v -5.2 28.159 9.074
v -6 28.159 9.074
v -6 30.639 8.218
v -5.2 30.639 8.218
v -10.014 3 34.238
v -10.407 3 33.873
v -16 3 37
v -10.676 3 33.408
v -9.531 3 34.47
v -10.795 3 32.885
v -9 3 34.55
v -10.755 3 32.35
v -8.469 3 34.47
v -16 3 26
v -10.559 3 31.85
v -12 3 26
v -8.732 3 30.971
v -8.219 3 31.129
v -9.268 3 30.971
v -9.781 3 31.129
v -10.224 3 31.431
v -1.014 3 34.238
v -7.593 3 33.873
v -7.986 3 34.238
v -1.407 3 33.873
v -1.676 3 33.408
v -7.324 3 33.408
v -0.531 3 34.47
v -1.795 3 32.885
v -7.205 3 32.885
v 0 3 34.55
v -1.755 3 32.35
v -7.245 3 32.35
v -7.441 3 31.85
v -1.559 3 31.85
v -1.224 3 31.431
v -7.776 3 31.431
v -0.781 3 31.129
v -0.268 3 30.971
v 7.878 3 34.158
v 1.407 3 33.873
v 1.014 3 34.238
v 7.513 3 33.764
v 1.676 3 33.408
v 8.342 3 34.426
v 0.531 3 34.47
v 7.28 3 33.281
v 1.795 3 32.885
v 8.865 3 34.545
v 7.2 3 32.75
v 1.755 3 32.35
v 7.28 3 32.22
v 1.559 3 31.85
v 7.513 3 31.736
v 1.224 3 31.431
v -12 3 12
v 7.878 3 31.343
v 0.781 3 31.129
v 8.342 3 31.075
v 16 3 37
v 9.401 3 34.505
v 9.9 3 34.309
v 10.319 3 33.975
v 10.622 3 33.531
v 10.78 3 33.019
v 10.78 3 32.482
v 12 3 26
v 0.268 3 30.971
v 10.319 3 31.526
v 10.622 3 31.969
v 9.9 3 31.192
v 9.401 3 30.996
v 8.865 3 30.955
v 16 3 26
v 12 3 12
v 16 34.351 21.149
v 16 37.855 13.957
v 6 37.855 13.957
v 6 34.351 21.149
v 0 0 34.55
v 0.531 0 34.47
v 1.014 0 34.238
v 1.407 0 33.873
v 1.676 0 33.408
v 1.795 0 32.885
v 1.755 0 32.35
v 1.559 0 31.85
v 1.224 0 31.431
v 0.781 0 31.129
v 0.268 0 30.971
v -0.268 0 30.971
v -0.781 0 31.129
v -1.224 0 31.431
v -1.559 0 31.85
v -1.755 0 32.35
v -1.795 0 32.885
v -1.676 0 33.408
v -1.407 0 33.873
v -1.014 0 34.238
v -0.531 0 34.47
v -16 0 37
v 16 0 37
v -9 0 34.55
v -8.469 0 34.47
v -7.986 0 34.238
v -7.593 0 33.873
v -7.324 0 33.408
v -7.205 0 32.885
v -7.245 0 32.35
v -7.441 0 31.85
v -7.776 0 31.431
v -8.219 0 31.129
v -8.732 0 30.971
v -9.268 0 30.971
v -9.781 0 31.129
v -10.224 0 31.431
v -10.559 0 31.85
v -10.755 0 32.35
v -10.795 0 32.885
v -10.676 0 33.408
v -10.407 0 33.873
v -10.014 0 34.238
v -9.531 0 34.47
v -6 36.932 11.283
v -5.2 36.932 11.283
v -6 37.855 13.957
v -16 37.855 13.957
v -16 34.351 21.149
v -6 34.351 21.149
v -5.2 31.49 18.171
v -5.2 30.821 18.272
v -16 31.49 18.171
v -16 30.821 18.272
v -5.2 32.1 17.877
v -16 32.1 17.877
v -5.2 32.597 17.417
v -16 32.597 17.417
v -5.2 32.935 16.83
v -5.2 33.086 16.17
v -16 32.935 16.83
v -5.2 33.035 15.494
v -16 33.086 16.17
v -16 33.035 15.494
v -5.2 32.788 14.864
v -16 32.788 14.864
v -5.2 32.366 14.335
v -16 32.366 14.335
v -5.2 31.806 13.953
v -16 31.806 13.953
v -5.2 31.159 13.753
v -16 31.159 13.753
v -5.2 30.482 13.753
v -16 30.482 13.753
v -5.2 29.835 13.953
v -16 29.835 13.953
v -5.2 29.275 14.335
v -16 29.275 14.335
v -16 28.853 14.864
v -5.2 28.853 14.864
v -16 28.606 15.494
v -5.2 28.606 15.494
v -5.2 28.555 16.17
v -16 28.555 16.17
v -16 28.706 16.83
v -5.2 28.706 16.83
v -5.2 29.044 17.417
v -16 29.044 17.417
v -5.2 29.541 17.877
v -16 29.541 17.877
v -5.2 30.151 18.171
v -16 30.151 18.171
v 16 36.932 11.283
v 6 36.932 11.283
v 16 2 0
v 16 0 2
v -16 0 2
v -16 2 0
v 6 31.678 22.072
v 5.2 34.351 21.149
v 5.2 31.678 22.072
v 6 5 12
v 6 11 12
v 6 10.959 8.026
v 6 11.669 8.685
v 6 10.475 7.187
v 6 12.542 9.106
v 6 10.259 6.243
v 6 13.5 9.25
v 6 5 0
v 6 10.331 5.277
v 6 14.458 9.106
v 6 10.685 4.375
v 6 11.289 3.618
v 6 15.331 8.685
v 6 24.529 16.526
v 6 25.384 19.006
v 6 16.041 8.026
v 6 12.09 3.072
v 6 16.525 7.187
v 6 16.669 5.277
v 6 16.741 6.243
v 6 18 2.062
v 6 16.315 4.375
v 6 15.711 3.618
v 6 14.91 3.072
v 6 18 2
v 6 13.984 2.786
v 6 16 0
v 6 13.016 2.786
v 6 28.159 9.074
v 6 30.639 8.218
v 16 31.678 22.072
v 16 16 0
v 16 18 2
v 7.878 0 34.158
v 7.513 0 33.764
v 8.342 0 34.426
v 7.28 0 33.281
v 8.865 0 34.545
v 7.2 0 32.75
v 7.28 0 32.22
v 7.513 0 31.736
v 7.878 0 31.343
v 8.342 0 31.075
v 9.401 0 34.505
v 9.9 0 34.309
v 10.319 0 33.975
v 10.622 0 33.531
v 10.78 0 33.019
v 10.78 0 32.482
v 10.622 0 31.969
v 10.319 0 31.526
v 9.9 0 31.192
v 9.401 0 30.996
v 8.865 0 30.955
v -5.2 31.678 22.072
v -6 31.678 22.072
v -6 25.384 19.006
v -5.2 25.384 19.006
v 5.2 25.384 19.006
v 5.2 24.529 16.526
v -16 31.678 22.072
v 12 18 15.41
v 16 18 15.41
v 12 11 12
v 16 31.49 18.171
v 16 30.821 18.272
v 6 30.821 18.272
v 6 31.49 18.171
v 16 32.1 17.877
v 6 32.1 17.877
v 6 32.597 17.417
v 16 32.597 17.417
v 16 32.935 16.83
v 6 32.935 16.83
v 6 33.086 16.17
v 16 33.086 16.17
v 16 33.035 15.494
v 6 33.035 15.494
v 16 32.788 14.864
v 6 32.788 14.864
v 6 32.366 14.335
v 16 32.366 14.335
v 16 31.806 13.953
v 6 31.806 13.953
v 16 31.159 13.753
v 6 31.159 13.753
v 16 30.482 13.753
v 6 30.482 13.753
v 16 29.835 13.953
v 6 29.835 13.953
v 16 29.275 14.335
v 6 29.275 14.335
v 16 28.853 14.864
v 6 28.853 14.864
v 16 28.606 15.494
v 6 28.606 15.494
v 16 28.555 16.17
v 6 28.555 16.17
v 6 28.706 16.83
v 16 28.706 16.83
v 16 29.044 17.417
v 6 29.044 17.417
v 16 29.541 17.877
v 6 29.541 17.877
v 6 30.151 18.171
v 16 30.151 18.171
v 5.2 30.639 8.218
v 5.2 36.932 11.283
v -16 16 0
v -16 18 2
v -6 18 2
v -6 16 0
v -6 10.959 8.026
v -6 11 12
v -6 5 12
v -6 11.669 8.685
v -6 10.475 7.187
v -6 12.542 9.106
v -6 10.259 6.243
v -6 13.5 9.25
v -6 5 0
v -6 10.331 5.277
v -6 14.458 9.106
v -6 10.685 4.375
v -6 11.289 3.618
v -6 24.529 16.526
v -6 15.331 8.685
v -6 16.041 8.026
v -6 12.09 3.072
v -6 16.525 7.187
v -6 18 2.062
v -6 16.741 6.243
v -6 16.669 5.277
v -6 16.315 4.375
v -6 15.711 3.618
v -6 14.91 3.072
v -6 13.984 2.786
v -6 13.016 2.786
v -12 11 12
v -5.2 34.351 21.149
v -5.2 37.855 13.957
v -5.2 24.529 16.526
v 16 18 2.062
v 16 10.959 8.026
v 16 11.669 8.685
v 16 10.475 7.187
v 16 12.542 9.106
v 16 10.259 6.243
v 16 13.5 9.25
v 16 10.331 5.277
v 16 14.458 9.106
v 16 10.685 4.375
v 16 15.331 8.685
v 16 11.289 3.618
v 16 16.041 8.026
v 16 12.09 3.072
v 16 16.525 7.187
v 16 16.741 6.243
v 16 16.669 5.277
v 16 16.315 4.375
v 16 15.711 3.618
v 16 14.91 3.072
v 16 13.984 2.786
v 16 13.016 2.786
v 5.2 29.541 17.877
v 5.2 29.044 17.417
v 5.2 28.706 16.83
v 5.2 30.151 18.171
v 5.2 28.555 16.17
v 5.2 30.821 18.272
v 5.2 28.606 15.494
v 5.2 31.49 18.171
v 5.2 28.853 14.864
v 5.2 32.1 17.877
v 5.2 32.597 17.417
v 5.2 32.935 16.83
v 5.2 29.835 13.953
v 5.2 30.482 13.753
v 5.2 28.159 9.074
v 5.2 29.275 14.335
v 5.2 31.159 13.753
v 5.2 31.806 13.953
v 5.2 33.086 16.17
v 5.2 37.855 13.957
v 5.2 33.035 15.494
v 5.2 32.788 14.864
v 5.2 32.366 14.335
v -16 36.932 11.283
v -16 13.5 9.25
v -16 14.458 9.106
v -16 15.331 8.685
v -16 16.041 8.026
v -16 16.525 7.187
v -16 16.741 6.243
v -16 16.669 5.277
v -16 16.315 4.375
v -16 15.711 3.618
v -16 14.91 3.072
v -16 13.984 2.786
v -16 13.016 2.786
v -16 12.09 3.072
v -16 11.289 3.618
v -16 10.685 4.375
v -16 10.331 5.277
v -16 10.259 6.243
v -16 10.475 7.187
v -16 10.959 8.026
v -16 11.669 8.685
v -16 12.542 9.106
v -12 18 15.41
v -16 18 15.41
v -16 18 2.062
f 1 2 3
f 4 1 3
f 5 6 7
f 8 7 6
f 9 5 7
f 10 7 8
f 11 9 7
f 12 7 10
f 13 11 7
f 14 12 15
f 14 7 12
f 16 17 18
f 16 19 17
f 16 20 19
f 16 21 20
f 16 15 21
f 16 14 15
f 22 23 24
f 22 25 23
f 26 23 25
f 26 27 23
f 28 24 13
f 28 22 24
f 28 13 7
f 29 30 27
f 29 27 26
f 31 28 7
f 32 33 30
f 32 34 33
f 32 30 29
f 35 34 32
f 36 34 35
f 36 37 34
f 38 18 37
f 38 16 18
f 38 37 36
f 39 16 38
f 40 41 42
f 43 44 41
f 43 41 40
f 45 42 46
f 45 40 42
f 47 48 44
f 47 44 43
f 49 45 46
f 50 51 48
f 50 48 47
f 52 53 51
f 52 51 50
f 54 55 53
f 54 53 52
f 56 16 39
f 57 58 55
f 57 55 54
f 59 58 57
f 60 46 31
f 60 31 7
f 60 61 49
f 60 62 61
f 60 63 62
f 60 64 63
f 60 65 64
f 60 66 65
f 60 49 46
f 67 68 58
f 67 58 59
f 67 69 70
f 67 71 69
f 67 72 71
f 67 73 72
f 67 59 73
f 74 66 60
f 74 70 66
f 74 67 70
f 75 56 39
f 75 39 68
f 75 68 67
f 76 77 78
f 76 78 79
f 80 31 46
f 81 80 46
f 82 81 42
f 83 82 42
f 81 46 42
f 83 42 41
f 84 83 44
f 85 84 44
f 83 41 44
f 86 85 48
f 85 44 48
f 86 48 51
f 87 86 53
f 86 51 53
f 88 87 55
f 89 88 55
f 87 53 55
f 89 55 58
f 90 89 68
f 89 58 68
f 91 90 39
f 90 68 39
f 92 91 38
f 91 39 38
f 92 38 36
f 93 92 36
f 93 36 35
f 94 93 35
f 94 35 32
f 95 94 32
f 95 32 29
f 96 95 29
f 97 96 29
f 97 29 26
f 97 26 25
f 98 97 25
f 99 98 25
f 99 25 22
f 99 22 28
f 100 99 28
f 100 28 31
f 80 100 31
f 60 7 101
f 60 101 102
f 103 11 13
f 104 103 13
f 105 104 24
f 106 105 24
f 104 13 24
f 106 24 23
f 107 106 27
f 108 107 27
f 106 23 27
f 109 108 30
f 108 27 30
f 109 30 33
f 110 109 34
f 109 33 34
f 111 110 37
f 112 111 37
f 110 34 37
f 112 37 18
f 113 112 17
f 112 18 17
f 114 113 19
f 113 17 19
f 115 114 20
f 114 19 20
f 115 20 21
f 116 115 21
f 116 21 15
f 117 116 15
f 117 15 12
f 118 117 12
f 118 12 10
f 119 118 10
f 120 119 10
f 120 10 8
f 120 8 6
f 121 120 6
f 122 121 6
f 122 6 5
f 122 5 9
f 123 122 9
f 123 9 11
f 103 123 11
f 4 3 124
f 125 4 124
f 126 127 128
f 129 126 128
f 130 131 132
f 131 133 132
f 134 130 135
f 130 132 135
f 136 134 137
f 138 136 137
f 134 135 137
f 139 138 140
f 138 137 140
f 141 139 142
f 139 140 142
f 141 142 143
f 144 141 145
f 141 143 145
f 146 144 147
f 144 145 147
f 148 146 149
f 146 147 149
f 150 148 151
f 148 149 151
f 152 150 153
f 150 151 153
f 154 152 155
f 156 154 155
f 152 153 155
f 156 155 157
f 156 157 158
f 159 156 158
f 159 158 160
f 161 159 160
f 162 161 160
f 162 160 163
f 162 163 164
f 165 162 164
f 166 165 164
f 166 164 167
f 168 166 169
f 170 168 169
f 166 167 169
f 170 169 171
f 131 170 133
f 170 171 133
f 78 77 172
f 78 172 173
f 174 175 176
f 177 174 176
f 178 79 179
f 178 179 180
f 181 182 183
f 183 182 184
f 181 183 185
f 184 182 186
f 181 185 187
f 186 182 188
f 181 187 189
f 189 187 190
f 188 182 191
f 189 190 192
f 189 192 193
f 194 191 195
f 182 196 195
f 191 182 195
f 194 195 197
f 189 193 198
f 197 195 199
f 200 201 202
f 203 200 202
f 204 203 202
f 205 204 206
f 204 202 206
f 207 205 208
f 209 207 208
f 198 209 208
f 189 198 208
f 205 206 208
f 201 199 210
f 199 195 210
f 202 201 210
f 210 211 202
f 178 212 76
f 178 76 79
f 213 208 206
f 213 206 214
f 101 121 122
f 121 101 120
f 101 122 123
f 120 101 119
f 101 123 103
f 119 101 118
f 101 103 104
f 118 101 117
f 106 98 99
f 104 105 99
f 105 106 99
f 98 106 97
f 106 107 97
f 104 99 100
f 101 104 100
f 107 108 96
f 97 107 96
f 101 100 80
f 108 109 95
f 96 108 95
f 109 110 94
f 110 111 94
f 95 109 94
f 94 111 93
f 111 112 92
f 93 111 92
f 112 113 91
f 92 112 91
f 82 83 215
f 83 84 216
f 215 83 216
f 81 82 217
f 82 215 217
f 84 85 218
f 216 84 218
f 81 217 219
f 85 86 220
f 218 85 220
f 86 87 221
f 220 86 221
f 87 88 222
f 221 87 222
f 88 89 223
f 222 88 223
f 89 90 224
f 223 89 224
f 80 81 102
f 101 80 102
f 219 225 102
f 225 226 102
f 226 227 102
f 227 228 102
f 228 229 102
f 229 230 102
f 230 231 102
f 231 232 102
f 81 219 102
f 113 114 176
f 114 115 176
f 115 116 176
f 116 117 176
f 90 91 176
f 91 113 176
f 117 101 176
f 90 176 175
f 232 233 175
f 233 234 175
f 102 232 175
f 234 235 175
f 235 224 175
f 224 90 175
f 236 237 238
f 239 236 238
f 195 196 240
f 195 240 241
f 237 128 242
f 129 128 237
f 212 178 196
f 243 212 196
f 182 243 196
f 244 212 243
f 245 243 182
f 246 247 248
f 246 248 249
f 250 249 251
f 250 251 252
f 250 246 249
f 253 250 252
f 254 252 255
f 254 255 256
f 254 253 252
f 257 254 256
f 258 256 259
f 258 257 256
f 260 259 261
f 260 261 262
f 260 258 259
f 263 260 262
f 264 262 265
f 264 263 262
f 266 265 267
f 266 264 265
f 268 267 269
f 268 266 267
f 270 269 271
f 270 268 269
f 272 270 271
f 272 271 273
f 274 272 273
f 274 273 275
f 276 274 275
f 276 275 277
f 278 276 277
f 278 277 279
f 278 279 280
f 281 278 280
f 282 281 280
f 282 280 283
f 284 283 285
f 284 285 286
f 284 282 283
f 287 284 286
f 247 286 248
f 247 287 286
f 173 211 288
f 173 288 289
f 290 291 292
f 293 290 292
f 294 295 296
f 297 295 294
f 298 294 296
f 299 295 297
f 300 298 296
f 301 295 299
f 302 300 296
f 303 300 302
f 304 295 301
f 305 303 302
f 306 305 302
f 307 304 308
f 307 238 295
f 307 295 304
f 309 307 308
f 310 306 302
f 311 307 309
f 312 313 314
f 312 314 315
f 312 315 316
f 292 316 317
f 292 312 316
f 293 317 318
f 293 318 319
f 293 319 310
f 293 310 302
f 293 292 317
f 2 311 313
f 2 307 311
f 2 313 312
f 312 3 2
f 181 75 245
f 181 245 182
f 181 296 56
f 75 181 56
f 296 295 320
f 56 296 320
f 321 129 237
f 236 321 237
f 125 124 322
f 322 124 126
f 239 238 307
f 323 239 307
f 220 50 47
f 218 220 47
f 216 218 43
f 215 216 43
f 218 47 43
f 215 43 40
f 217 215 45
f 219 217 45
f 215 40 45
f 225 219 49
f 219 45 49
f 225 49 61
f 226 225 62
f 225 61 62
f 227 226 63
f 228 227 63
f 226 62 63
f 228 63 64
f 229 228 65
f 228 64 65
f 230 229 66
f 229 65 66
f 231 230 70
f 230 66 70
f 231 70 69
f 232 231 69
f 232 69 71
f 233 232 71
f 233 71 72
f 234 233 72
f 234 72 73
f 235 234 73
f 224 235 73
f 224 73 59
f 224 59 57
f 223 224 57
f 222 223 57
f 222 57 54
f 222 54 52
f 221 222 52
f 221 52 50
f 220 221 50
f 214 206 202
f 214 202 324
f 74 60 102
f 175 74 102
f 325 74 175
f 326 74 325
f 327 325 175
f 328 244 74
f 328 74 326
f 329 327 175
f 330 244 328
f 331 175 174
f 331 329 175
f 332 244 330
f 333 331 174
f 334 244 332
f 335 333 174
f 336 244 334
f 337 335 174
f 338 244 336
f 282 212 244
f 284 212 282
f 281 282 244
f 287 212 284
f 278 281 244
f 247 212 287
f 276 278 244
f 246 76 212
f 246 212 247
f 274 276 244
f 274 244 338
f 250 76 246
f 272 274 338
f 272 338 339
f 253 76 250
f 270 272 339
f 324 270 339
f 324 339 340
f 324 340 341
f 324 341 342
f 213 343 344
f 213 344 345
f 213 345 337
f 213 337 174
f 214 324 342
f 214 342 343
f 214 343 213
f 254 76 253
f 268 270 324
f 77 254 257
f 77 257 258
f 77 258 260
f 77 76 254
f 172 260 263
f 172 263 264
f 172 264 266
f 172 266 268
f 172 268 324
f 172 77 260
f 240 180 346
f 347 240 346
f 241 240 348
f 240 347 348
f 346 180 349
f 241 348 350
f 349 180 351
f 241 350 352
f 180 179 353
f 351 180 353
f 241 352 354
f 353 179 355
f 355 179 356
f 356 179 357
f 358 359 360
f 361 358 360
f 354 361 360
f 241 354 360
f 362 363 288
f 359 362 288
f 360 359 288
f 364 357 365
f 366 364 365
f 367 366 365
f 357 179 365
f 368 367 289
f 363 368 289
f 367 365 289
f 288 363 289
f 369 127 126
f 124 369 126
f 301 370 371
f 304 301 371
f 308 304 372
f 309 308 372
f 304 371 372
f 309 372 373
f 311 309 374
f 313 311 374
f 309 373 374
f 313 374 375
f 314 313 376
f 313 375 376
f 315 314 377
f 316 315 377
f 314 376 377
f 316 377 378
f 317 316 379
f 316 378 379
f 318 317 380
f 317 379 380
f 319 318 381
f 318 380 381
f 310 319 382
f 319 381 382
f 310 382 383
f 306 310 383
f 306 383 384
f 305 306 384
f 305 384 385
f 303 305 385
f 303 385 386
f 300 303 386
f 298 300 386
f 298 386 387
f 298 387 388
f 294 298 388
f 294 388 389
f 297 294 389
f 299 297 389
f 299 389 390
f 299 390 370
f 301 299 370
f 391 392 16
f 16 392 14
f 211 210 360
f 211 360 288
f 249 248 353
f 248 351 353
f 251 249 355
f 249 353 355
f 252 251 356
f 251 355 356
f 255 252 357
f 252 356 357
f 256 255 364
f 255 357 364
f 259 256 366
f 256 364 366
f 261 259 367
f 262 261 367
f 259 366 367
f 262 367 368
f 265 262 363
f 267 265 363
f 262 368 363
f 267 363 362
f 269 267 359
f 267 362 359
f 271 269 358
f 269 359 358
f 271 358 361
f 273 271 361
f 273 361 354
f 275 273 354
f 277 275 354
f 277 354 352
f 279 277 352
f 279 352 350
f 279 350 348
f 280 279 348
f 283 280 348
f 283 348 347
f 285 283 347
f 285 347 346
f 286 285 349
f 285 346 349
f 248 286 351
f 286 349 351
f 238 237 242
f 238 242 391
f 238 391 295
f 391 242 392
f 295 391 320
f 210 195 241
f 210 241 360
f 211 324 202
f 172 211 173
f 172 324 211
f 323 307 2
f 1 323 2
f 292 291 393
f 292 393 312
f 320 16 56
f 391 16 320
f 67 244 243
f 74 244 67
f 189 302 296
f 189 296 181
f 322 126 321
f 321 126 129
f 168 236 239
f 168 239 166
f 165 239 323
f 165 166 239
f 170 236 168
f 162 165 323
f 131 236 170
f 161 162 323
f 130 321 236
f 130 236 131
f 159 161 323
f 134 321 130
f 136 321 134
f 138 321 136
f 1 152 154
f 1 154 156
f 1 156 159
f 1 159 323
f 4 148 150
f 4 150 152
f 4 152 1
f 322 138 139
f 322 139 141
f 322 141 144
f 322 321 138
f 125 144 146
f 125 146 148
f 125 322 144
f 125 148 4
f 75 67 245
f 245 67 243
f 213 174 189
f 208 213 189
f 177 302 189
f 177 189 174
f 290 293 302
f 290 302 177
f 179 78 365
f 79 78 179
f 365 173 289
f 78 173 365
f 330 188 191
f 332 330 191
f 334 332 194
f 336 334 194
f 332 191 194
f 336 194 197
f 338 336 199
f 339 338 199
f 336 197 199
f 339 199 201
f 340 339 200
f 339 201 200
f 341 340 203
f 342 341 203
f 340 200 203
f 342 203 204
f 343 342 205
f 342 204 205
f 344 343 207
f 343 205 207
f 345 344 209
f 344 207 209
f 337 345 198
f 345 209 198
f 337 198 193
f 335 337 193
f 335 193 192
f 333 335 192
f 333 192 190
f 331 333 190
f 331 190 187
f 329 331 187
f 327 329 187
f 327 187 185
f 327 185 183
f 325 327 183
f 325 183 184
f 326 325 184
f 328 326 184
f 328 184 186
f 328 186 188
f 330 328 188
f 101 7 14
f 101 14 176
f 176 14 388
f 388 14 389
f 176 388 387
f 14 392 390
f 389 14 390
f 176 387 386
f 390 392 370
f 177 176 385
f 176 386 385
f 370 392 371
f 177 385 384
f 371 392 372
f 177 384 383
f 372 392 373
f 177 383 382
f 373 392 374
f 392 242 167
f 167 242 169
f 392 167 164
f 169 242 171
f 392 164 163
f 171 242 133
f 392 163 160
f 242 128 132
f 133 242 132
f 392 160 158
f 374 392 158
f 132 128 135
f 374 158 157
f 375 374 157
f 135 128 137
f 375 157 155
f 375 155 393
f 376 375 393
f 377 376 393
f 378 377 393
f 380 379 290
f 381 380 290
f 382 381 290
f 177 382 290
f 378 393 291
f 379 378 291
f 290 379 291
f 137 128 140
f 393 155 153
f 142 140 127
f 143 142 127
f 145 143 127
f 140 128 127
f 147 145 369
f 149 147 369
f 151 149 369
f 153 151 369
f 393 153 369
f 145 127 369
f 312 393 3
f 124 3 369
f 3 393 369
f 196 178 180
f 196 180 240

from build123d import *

# Parameters (mm, degrees)
EXTRUDE_1_DEPTH     = 12
SKETCH_2_W          = 32
SKETCH_2_H          = 3
EXTRUDE_2_DEPTH     = 25
SKETCH_3_R          = 3.25
CUT_EXTRUDE_1_DEPTH = 38
SKETCH_4_R          = 2.271913659
EXTRUDE_3_DEPTH     = 10
CHAMFER_2_SIZE      = 2
CHAMFER_3_SIZE      = 2
EXTRUDE_4_DEPTH     = 4
CHAMFER_4_SIZE      = 2
SKETCH_6_R          = 1.8
CUT_EXTRUDE_2_DEPTH = 8
EXTRUDE_5_DEPTH     = 0.8
SKETCH_8_R          = 2.271913659
CUT_EXTRUDE_3_DEPTH = 23


with BuildPart() as part:
    # 草图1 → 凸台-拉伸1 (new body)
    with BuildSketch(Plane.XY):
        Polygon((16, 0), (-16, 0), (-16, 18), (-6, 18), (-6, 5), (6, 5), (6, 18), (16, 18), align=None)
    extrude(amount=EXTRUDE_1_DEPTH)

    # 草图2 → 凸台-拉伸2 (add)
    with BuildSketch(Plane.XY.offset(12)):
        with Locations((0, 1.5)):
            Rectangle(SKETCH_2_W, SKETCH_2_H)
    extrude(amount=EXTRUDE_2_DEPTH)

    # 草图3 → 切除-拉伸1 (cut)
    with BuildSketch(Plane.ZY.offset(16)):
        with Locations((6, 13.5)):
            Circle(SKETCH_3_R)
    extrude(amount=-CUT_EXTRUDE_1_DEPTH, mode=Mode.SUBTRACT)

    # 草图4 → 凸台-拉伸3 (add)
    with BuildSketch(Plane.ZY.offset(16)):
        Polygon((2.061755591, 18), (12.158971032, 38.730393582), (22.947301651, 33.47568879), (12, 11), (12, 18), align=None)
        with Locations((16, 30.820508076)):
            Circle(SKETCH_4_R, mode=Mode.SUBTRACT)
    extrude_3 = extrude(amount=-EXTRUDE_3_DEPTH)

    # 镜向1: 凸台-拉伸3 across plane
    add(extrude_3.mirror(Plane(origin=(0, 0, 0), x_dir=(0, 0, 1), z_dir=(1, 0, 0))))

    # 倒角2
    chamfer_2_edges = [part.edges().sort_by_distance(p)[0] for p in [
        (11, 18, 0),
        (-11, 18, 0),
    ]]
    chamfer(chamfer_2_edges, length=CHAMFER_2_SIZE)

    # 倒角3
    chamfer_3_edges = [part.edges().sort_by_distance(p)[0] for p in [
        (-11, 38.730393582, 12.158971032),
        (-11, 33.47568879, 22.947301651),
        (11, 33.47568879, 22.947301651),
        (11, 38.730393582, 12.158971032),
    ]]
    chamfer(chamfer_3_edges, length=CHAMFER_3_SIZE)

    # 草图5 → 凸台-拉伸4 (add)
    with BuildSketch(Plane.ZY.offset(16)):
        Polygon((15.409511151, 18), (26, 3), (12, 3), (12, 11), align=None)
    extrude_4 = extrude(amount=-EXTRUDE_4_DEPTH)

    # 镜向2: 凸台-拉伸4 across plane
    add(extrude_4.mirror(Plane(origin=(0, 0, 0), x_dir=(0, 0, 1), z_dir=(1, 0, 0))))

    # 倒角4
    chamfer_4_edges = [part.edges().sort_by_distance(p)[0] for p in [
        (0, 0, 0),
    ]]
    chamfer(chamfer_4_edges, length=CHAMFER_4_SIZE)

    # 草图6 → 切除-拉伸2 (cut)
    with BuildSketch(Plane(origin=(0, 3, 0), x_dir=(1, 0, 0), z_dir=(0, 1, 0))):
        with Locations(Location((0, -32.750411326, 0), (0, 0, 270))):
            Circle(SKETCH_6_R)
        with Locations(Location((-9, -32.750411326, 0), (0, 0, 270))):
            Circle(SKETCH_6_R)
        with Locations(Location((9, -32.750411326, 0), (0, 0, 180))):
            Circle(SKETCH_6_R)
    extrude(amount=-CUT_EXTRUDE_2_DEPTH, mode=Mode.SUBTRACT)

    # 草图7 → 凸台-拉伸5 (add)
    with BuildSketch(Plane.ZY.offset(-6)):
        Polygon((11.2831869, 36.932338479), (13.957026135, 37.85460945), (21.149246548, 34.351472922), (22.071517519, 31.677633686), (19.006273057, 25.384440825), (16.525669772, 24.528821546), (9.073561717, 28.158542333), (8.217942438, 30.639145618), align=None)
    extrude_5 = extrude(amount=EXTRUDE_5_DEPTH)

    # 镜向3: 凸台-拉伸5 across plane
    add(extrude_5.mirror(Plane(origin=(0, 0, 0), x_dir=(0, 0, 1), z_dir=(1, 0, 0))))

    # 草图8 → 切除-拉伸3 (cut)
    with BuildSketch(Plane.ZY.offset(6)):
        with Locations((16, 30.820508076)):
            Circle(SKETCH_8_R)
    extrude(amount=-CUT_EXTRUDE_3_DEPTH, mode=Mode.SUBTRACT)


solid = part.part
